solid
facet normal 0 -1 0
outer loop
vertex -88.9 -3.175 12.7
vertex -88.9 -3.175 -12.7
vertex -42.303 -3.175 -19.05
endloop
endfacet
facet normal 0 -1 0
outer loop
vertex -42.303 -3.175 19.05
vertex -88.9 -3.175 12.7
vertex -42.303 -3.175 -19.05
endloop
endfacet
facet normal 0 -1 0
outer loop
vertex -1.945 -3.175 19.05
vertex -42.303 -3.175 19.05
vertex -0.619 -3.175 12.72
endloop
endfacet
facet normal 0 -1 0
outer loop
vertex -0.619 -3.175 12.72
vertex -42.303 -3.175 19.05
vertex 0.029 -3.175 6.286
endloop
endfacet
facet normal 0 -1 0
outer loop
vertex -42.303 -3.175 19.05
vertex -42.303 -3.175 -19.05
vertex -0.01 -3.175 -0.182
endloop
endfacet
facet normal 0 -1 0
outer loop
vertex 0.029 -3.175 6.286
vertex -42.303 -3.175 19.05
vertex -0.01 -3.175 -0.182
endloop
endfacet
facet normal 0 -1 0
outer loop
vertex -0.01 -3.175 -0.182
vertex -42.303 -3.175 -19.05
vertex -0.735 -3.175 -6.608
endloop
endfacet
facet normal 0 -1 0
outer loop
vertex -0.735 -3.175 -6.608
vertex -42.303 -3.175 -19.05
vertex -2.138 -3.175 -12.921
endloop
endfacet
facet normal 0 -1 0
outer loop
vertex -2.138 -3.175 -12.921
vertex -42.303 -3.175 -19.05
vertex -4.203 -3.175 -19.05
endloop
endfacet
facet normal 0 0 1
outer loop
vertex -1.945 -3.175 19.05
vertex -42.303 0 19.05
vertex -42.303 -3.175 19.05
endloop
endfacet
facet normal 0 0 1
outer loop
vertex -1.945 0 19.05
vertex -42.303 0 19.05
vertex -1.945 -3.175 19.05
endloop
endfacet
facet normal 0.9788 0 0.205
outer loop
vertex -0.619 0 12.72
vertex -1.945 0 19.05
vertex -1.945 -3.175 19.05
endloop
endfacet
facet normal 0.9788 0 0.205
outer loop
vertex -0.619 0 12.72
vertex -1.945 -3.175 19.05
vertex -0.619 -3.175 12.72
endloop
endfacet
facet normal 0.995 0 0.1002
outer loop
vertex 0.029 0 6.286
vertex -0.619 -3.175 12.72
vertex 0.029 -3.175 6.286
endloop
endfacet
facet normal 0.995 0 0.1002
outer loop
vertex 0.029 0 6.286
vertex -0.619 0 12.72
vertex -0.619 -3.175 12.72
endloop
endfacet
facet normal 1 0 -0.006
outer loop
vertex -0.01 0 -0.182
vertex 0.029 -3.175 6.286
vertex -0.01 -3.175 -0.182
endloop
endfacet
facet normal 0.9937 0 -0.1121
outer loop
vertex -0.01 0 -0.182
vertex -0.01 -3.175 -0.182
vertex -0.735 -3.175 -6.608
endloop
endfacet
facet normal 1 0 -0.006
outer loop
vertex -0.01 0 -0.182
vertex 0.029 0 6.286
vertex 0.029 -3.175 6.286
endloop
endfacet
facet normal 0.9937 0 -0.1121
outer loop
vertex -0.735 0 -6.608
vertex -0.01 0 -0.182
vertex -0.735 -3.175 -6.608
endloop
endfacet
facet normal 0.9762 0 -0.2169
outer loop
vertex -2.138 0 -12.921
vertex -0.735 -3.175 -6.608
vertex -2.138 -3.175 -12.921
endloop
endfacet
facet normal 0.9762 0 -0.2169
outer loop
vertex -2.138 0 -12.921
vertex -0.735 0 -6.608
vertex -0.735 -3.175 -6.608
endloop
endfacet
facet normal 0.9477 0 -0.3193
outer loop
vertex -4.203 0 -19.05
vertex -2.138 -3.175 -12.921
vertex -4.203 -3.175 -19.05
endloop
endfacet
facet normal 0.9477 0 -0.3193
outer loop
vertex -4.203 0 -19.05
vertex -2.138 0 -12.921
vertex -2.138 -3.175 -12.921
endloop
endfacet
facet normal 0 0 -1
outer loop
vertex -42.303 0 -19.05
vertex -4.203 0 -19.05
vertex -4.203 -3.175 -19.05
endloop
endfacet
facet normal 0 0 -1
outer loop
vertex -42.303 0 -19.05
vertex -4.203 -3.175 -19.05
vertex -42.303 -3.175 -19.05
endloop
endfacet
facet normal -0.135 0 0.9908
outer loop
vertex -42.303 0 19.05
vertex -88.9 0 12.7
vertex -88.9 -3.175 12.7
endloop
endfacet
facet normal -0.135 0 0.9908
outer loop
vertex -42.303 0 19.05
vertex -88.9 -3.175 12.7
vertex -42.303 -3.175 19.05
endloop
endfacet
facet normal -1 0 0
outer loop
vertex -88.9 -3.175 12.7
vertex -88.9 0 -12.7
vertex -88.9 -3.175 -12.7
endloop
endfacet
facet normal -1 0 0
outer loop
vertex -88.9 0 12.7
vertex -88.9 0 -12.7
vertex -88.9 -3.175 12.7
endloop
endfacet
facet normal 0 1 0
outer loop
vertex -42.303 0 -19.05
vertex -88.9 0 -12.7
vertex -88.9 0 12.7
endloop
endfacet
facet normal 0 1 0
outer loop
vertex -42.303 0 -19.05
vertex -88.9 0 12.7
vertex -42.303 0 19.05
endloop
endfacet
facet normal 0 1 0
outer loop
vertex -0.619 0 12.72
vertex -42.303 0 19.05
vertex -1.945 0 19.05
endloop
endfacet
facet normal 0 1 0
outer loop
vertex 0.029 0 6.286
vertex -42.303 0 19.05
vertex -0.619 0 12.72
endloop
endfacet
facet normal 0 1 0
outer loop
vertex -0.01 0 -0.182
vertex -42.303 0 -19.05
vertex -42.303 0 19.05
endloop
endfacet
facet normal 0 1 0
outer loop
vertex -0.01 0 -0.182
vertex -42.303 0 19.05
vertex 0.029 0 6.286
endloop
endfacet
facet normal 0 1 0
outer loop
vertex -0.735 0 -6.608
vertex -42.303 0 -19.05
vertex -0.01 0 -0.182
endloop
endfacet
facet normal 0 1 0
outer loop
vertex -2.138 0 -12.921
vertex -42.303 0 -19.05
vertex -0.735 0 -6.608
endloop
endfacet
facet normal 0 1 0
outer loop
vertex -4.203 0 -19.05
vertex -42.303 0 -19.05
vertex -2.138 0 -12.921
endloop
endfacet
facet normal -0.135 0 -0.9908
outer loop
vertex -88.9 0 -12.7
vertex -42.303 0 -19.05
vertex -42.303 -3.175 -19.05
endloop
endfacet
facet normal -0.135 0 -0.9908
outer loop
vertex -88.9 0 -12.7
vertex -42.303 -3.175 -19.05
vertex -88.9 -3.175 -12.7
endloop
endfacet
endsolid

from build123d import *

# Parameters (mm, degrees)
BOSS_EXTRUDE1_DEPTH = 3.175


with BuildPart() as part:
    # Sketch1 → Boss-Extrude1 (new body)
    with BuildSketch(Plane(origin=(0, 0, 0), x_dir=(1, 0, 0), z_dir=(0, 1, 0))):
        with BuildLine():
            Line((-4.202954503, 19.05), (-42.302954503, 19.05))
            Line((-42.302954503, 19.05), (-88.9, 12.7))
            Line((-88.9, 12.7), (-88.9, -12.7))
            Line((-88.9, -12.7), (-42.302954503, -19.05))
            Line((-42.302954503, -19.05), (-1.945497784, -19.05))
            ThreePointArc((-1.945497784, -19.05), (-0.010483672, 0.181529292), (-4.202954503, 19.05))
        make_face()
    extrude(amount=-BOSS_EXTRUDE1_DEPTH)


solid = part.part
